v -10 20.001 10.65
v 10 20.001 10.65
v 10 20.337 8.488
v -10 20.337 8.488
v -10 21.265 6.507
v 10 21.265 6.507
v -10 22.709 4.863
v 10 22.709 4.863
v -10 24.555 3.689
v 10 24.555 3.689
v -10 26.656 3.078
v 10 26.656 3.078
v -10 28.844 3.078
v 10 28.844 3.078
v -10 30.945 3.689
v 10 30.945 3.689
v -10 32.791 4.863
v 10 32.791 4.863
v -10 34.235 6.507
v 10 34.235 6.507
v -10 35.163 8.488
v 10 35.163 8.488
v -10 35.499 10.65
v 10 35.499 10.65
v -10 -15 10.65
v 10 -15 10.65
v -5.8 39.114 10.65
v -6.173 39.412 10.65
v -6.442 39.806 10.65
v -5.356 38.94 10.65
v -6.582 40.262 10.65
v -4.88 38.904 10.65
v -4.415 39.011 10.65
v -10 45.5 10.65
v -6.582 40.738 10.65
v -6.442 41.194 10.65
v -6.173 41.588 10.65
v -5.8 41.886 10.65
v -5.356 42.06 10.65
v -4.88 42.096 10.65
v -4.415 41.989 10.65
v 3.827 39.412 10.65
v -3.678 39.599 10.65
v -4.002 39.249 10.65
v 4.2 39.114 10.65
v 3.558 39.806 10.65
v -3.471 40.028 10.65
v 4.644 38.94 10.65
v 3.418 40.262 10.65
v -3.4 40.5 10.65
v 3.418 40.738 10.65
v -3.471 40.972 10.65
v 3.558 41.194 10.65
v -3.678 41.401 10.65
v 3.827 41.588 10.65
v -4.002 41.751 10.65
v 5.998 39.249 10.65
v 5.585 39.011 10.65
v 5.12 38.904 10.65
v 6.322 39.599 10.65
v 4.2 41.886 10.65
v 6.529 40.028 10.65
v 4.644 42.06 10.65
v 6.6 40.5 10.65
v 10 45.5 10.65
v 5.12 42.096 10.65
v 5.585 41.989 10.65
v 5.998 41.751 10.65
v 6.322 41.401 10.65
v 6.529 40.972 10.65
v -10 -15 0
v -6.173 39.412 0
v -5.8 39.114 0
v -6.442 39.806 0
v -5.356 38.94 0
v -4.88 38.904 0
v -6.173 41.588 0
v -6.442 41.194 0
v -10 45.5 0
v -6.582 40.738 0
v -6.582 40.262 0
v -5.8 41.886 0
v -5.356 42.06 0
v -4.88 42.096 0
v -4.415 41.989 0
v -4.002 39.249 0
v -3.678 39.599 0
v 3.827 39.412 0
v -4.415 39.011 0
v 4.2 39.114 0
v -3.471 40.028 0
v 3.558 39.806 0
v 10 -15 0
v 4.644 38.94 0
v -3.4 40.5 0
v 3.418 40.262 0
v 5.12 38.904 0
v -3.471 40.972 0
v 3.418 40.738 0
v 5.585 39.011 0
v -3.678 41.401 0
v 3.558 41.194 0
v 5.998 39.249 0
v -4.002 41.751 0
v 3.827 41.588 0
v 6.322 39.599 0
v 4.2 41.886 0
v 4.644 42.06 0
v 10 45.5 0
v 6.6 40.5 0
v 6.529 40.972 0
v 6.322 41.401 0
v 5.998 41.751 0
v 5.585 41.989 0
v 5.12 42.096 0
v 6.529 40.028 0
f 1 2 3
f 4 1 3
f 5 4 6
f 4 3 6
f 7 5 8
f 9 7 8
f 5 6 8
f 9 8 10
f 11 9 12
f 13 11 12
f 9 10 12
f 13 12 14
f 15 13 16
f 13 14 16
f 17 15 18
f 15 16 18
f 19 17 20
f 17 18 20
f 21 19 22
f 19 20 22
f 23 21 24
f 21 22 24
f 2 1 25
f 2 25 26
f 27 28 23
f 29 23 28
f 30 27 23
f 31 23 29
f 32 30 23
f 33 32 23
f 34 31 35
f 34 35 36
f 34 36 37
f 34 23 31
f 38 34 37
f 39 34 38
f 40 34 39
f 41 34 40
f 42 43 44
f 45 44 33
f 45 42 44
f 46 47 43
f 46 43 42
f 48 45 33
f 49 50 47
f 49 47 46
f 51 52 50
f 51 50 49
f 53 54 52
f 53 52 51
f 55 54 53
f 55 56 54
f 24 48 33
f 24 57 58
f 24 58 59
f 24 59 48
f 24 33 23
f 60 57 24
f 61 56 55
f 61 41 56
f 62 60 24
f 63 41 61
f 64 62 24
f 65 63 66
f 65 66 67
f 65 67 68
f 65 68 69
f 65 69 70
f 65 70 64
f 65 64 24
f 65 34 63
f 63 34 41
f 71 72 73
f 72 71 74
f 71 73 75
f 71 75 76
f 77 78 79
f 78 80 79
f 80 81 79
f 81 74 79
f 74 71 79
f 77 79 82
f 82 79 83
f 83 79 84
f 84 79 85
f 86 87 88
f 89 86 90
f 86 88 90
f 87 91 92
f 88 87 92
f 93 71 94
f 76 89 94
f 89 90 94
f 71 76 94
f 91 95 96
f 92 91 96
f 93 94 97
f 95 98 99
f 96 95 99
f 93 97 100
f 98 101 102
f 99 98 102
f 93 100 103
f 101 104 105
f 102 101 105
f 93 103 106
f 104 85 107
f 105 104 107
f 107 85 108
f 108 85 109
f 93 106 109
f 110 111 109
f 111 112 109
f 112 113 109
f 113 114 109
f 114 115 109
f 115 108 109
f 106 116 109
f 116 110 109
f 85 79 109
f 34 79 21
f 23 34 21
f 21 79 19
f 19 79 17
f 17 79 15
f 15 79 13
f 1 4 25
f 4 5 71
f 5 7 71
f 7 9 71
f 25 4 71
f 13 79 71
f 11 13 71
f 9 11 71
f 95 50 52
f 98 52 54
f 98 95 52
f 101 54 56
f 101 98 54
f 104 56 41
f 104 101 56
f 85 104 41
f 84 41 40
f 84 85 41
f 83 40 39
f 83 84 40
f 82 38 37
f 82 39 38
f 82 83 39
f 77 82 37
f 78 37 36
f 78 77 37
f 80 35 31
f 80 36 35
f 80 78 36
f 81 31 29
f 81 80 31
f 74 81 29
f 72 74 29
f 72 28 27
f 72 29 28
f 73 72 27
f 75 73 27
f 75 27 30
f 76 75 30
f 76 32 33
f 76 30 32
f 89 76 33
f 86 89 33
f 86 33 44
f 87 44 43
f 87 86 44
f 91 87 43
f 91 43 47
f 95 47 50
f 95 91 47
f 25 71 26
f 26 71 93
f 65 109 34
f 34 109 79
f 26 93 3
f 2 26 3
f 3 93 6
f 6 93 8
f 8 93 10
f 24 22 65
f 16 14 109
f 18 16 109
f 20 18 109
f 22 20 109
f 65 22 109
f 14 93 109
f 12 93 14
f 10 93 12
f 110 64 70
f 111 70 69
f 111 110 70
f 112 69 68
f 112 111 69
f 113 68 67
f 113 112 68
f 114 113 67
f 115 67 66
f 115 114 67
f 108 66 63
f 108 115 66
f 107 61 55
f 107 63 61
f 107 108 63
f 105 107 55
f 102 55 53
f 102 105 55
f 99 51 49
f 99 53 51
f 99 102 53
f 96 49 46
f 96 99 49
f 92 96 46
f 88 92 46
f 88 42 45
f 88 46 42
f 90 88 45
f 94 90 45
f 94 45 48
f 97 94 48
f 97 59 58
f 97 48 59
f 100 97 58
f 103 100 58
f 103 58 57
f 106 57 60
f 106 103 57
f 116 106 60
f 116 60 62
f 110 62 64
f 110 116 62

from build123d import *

# Parameters (mm, degrees)
F0_W     = 20
F0_H     = 30
F0_H_2   = 5
F0_R     = 1.6
F1_DEPTH = 10.75
F3_DEPTH = 25
F4_W     = 37.611449
F4_H     = 93.224645
F5_DEPTH = 0.1


with BuildPart() as f1:
    # F0 (on Top) → F1 (new body)
    with BuildSketch(Plane.XY):
        Rectangle(F0_W, F0_H)
        with Locations((0, 17.5)):
            Rectangle(F0_W, F0_H_2)
        Polygon((-10, 20), (10, 20), (10, 35.5), (0, 35.5), (-10, 35.5), align=None)
        Polygon((0, 35.5), (10, 35.5), (10, 45.5), (0, 45.5), (-10, 45.5), (-10, 35.5), align=None)
        with Locations((-5, 40.5)):
            Circle(F0_R, mode=Mode.SUBTRACT)
        with Locations((5, 40.5)):
            Circle(F0_R, mode=Mode.SUBTRACT)
    extrude(amount=F1_DEPTH)

    # F2 (on face) → F3 (cut)
    with BuildSketch(Plane.YZ.offset(10)):
        with BuildLine():
            ThreePointArc((20, 10.75), (27.75, 3), (35.5, 10.75))
            Line((35.5, 10.75), (20, 10.75))
        make_face()
        with BuildLine():
            Line((20, 10.75), (35.5, 10.75))
            ThreePointArc((35.5, 10.75), (27.75, 18.5), (20, 10.75))
        make_face()
    extrude(amount=-F3_DEPTH, mode=Mode.SUBTRACT)

    # F4 (on face) → F5 (cut)
    with BuildSketch(Plane.XY.offset(10.75)):
        with Locations((3.746708, 22.084623)):
            Rectangle(F4_W, F4_H)
    extrude(amount=-F5_DEPTH, mode=Mode.SUBTRACT)


solid = f1.part
